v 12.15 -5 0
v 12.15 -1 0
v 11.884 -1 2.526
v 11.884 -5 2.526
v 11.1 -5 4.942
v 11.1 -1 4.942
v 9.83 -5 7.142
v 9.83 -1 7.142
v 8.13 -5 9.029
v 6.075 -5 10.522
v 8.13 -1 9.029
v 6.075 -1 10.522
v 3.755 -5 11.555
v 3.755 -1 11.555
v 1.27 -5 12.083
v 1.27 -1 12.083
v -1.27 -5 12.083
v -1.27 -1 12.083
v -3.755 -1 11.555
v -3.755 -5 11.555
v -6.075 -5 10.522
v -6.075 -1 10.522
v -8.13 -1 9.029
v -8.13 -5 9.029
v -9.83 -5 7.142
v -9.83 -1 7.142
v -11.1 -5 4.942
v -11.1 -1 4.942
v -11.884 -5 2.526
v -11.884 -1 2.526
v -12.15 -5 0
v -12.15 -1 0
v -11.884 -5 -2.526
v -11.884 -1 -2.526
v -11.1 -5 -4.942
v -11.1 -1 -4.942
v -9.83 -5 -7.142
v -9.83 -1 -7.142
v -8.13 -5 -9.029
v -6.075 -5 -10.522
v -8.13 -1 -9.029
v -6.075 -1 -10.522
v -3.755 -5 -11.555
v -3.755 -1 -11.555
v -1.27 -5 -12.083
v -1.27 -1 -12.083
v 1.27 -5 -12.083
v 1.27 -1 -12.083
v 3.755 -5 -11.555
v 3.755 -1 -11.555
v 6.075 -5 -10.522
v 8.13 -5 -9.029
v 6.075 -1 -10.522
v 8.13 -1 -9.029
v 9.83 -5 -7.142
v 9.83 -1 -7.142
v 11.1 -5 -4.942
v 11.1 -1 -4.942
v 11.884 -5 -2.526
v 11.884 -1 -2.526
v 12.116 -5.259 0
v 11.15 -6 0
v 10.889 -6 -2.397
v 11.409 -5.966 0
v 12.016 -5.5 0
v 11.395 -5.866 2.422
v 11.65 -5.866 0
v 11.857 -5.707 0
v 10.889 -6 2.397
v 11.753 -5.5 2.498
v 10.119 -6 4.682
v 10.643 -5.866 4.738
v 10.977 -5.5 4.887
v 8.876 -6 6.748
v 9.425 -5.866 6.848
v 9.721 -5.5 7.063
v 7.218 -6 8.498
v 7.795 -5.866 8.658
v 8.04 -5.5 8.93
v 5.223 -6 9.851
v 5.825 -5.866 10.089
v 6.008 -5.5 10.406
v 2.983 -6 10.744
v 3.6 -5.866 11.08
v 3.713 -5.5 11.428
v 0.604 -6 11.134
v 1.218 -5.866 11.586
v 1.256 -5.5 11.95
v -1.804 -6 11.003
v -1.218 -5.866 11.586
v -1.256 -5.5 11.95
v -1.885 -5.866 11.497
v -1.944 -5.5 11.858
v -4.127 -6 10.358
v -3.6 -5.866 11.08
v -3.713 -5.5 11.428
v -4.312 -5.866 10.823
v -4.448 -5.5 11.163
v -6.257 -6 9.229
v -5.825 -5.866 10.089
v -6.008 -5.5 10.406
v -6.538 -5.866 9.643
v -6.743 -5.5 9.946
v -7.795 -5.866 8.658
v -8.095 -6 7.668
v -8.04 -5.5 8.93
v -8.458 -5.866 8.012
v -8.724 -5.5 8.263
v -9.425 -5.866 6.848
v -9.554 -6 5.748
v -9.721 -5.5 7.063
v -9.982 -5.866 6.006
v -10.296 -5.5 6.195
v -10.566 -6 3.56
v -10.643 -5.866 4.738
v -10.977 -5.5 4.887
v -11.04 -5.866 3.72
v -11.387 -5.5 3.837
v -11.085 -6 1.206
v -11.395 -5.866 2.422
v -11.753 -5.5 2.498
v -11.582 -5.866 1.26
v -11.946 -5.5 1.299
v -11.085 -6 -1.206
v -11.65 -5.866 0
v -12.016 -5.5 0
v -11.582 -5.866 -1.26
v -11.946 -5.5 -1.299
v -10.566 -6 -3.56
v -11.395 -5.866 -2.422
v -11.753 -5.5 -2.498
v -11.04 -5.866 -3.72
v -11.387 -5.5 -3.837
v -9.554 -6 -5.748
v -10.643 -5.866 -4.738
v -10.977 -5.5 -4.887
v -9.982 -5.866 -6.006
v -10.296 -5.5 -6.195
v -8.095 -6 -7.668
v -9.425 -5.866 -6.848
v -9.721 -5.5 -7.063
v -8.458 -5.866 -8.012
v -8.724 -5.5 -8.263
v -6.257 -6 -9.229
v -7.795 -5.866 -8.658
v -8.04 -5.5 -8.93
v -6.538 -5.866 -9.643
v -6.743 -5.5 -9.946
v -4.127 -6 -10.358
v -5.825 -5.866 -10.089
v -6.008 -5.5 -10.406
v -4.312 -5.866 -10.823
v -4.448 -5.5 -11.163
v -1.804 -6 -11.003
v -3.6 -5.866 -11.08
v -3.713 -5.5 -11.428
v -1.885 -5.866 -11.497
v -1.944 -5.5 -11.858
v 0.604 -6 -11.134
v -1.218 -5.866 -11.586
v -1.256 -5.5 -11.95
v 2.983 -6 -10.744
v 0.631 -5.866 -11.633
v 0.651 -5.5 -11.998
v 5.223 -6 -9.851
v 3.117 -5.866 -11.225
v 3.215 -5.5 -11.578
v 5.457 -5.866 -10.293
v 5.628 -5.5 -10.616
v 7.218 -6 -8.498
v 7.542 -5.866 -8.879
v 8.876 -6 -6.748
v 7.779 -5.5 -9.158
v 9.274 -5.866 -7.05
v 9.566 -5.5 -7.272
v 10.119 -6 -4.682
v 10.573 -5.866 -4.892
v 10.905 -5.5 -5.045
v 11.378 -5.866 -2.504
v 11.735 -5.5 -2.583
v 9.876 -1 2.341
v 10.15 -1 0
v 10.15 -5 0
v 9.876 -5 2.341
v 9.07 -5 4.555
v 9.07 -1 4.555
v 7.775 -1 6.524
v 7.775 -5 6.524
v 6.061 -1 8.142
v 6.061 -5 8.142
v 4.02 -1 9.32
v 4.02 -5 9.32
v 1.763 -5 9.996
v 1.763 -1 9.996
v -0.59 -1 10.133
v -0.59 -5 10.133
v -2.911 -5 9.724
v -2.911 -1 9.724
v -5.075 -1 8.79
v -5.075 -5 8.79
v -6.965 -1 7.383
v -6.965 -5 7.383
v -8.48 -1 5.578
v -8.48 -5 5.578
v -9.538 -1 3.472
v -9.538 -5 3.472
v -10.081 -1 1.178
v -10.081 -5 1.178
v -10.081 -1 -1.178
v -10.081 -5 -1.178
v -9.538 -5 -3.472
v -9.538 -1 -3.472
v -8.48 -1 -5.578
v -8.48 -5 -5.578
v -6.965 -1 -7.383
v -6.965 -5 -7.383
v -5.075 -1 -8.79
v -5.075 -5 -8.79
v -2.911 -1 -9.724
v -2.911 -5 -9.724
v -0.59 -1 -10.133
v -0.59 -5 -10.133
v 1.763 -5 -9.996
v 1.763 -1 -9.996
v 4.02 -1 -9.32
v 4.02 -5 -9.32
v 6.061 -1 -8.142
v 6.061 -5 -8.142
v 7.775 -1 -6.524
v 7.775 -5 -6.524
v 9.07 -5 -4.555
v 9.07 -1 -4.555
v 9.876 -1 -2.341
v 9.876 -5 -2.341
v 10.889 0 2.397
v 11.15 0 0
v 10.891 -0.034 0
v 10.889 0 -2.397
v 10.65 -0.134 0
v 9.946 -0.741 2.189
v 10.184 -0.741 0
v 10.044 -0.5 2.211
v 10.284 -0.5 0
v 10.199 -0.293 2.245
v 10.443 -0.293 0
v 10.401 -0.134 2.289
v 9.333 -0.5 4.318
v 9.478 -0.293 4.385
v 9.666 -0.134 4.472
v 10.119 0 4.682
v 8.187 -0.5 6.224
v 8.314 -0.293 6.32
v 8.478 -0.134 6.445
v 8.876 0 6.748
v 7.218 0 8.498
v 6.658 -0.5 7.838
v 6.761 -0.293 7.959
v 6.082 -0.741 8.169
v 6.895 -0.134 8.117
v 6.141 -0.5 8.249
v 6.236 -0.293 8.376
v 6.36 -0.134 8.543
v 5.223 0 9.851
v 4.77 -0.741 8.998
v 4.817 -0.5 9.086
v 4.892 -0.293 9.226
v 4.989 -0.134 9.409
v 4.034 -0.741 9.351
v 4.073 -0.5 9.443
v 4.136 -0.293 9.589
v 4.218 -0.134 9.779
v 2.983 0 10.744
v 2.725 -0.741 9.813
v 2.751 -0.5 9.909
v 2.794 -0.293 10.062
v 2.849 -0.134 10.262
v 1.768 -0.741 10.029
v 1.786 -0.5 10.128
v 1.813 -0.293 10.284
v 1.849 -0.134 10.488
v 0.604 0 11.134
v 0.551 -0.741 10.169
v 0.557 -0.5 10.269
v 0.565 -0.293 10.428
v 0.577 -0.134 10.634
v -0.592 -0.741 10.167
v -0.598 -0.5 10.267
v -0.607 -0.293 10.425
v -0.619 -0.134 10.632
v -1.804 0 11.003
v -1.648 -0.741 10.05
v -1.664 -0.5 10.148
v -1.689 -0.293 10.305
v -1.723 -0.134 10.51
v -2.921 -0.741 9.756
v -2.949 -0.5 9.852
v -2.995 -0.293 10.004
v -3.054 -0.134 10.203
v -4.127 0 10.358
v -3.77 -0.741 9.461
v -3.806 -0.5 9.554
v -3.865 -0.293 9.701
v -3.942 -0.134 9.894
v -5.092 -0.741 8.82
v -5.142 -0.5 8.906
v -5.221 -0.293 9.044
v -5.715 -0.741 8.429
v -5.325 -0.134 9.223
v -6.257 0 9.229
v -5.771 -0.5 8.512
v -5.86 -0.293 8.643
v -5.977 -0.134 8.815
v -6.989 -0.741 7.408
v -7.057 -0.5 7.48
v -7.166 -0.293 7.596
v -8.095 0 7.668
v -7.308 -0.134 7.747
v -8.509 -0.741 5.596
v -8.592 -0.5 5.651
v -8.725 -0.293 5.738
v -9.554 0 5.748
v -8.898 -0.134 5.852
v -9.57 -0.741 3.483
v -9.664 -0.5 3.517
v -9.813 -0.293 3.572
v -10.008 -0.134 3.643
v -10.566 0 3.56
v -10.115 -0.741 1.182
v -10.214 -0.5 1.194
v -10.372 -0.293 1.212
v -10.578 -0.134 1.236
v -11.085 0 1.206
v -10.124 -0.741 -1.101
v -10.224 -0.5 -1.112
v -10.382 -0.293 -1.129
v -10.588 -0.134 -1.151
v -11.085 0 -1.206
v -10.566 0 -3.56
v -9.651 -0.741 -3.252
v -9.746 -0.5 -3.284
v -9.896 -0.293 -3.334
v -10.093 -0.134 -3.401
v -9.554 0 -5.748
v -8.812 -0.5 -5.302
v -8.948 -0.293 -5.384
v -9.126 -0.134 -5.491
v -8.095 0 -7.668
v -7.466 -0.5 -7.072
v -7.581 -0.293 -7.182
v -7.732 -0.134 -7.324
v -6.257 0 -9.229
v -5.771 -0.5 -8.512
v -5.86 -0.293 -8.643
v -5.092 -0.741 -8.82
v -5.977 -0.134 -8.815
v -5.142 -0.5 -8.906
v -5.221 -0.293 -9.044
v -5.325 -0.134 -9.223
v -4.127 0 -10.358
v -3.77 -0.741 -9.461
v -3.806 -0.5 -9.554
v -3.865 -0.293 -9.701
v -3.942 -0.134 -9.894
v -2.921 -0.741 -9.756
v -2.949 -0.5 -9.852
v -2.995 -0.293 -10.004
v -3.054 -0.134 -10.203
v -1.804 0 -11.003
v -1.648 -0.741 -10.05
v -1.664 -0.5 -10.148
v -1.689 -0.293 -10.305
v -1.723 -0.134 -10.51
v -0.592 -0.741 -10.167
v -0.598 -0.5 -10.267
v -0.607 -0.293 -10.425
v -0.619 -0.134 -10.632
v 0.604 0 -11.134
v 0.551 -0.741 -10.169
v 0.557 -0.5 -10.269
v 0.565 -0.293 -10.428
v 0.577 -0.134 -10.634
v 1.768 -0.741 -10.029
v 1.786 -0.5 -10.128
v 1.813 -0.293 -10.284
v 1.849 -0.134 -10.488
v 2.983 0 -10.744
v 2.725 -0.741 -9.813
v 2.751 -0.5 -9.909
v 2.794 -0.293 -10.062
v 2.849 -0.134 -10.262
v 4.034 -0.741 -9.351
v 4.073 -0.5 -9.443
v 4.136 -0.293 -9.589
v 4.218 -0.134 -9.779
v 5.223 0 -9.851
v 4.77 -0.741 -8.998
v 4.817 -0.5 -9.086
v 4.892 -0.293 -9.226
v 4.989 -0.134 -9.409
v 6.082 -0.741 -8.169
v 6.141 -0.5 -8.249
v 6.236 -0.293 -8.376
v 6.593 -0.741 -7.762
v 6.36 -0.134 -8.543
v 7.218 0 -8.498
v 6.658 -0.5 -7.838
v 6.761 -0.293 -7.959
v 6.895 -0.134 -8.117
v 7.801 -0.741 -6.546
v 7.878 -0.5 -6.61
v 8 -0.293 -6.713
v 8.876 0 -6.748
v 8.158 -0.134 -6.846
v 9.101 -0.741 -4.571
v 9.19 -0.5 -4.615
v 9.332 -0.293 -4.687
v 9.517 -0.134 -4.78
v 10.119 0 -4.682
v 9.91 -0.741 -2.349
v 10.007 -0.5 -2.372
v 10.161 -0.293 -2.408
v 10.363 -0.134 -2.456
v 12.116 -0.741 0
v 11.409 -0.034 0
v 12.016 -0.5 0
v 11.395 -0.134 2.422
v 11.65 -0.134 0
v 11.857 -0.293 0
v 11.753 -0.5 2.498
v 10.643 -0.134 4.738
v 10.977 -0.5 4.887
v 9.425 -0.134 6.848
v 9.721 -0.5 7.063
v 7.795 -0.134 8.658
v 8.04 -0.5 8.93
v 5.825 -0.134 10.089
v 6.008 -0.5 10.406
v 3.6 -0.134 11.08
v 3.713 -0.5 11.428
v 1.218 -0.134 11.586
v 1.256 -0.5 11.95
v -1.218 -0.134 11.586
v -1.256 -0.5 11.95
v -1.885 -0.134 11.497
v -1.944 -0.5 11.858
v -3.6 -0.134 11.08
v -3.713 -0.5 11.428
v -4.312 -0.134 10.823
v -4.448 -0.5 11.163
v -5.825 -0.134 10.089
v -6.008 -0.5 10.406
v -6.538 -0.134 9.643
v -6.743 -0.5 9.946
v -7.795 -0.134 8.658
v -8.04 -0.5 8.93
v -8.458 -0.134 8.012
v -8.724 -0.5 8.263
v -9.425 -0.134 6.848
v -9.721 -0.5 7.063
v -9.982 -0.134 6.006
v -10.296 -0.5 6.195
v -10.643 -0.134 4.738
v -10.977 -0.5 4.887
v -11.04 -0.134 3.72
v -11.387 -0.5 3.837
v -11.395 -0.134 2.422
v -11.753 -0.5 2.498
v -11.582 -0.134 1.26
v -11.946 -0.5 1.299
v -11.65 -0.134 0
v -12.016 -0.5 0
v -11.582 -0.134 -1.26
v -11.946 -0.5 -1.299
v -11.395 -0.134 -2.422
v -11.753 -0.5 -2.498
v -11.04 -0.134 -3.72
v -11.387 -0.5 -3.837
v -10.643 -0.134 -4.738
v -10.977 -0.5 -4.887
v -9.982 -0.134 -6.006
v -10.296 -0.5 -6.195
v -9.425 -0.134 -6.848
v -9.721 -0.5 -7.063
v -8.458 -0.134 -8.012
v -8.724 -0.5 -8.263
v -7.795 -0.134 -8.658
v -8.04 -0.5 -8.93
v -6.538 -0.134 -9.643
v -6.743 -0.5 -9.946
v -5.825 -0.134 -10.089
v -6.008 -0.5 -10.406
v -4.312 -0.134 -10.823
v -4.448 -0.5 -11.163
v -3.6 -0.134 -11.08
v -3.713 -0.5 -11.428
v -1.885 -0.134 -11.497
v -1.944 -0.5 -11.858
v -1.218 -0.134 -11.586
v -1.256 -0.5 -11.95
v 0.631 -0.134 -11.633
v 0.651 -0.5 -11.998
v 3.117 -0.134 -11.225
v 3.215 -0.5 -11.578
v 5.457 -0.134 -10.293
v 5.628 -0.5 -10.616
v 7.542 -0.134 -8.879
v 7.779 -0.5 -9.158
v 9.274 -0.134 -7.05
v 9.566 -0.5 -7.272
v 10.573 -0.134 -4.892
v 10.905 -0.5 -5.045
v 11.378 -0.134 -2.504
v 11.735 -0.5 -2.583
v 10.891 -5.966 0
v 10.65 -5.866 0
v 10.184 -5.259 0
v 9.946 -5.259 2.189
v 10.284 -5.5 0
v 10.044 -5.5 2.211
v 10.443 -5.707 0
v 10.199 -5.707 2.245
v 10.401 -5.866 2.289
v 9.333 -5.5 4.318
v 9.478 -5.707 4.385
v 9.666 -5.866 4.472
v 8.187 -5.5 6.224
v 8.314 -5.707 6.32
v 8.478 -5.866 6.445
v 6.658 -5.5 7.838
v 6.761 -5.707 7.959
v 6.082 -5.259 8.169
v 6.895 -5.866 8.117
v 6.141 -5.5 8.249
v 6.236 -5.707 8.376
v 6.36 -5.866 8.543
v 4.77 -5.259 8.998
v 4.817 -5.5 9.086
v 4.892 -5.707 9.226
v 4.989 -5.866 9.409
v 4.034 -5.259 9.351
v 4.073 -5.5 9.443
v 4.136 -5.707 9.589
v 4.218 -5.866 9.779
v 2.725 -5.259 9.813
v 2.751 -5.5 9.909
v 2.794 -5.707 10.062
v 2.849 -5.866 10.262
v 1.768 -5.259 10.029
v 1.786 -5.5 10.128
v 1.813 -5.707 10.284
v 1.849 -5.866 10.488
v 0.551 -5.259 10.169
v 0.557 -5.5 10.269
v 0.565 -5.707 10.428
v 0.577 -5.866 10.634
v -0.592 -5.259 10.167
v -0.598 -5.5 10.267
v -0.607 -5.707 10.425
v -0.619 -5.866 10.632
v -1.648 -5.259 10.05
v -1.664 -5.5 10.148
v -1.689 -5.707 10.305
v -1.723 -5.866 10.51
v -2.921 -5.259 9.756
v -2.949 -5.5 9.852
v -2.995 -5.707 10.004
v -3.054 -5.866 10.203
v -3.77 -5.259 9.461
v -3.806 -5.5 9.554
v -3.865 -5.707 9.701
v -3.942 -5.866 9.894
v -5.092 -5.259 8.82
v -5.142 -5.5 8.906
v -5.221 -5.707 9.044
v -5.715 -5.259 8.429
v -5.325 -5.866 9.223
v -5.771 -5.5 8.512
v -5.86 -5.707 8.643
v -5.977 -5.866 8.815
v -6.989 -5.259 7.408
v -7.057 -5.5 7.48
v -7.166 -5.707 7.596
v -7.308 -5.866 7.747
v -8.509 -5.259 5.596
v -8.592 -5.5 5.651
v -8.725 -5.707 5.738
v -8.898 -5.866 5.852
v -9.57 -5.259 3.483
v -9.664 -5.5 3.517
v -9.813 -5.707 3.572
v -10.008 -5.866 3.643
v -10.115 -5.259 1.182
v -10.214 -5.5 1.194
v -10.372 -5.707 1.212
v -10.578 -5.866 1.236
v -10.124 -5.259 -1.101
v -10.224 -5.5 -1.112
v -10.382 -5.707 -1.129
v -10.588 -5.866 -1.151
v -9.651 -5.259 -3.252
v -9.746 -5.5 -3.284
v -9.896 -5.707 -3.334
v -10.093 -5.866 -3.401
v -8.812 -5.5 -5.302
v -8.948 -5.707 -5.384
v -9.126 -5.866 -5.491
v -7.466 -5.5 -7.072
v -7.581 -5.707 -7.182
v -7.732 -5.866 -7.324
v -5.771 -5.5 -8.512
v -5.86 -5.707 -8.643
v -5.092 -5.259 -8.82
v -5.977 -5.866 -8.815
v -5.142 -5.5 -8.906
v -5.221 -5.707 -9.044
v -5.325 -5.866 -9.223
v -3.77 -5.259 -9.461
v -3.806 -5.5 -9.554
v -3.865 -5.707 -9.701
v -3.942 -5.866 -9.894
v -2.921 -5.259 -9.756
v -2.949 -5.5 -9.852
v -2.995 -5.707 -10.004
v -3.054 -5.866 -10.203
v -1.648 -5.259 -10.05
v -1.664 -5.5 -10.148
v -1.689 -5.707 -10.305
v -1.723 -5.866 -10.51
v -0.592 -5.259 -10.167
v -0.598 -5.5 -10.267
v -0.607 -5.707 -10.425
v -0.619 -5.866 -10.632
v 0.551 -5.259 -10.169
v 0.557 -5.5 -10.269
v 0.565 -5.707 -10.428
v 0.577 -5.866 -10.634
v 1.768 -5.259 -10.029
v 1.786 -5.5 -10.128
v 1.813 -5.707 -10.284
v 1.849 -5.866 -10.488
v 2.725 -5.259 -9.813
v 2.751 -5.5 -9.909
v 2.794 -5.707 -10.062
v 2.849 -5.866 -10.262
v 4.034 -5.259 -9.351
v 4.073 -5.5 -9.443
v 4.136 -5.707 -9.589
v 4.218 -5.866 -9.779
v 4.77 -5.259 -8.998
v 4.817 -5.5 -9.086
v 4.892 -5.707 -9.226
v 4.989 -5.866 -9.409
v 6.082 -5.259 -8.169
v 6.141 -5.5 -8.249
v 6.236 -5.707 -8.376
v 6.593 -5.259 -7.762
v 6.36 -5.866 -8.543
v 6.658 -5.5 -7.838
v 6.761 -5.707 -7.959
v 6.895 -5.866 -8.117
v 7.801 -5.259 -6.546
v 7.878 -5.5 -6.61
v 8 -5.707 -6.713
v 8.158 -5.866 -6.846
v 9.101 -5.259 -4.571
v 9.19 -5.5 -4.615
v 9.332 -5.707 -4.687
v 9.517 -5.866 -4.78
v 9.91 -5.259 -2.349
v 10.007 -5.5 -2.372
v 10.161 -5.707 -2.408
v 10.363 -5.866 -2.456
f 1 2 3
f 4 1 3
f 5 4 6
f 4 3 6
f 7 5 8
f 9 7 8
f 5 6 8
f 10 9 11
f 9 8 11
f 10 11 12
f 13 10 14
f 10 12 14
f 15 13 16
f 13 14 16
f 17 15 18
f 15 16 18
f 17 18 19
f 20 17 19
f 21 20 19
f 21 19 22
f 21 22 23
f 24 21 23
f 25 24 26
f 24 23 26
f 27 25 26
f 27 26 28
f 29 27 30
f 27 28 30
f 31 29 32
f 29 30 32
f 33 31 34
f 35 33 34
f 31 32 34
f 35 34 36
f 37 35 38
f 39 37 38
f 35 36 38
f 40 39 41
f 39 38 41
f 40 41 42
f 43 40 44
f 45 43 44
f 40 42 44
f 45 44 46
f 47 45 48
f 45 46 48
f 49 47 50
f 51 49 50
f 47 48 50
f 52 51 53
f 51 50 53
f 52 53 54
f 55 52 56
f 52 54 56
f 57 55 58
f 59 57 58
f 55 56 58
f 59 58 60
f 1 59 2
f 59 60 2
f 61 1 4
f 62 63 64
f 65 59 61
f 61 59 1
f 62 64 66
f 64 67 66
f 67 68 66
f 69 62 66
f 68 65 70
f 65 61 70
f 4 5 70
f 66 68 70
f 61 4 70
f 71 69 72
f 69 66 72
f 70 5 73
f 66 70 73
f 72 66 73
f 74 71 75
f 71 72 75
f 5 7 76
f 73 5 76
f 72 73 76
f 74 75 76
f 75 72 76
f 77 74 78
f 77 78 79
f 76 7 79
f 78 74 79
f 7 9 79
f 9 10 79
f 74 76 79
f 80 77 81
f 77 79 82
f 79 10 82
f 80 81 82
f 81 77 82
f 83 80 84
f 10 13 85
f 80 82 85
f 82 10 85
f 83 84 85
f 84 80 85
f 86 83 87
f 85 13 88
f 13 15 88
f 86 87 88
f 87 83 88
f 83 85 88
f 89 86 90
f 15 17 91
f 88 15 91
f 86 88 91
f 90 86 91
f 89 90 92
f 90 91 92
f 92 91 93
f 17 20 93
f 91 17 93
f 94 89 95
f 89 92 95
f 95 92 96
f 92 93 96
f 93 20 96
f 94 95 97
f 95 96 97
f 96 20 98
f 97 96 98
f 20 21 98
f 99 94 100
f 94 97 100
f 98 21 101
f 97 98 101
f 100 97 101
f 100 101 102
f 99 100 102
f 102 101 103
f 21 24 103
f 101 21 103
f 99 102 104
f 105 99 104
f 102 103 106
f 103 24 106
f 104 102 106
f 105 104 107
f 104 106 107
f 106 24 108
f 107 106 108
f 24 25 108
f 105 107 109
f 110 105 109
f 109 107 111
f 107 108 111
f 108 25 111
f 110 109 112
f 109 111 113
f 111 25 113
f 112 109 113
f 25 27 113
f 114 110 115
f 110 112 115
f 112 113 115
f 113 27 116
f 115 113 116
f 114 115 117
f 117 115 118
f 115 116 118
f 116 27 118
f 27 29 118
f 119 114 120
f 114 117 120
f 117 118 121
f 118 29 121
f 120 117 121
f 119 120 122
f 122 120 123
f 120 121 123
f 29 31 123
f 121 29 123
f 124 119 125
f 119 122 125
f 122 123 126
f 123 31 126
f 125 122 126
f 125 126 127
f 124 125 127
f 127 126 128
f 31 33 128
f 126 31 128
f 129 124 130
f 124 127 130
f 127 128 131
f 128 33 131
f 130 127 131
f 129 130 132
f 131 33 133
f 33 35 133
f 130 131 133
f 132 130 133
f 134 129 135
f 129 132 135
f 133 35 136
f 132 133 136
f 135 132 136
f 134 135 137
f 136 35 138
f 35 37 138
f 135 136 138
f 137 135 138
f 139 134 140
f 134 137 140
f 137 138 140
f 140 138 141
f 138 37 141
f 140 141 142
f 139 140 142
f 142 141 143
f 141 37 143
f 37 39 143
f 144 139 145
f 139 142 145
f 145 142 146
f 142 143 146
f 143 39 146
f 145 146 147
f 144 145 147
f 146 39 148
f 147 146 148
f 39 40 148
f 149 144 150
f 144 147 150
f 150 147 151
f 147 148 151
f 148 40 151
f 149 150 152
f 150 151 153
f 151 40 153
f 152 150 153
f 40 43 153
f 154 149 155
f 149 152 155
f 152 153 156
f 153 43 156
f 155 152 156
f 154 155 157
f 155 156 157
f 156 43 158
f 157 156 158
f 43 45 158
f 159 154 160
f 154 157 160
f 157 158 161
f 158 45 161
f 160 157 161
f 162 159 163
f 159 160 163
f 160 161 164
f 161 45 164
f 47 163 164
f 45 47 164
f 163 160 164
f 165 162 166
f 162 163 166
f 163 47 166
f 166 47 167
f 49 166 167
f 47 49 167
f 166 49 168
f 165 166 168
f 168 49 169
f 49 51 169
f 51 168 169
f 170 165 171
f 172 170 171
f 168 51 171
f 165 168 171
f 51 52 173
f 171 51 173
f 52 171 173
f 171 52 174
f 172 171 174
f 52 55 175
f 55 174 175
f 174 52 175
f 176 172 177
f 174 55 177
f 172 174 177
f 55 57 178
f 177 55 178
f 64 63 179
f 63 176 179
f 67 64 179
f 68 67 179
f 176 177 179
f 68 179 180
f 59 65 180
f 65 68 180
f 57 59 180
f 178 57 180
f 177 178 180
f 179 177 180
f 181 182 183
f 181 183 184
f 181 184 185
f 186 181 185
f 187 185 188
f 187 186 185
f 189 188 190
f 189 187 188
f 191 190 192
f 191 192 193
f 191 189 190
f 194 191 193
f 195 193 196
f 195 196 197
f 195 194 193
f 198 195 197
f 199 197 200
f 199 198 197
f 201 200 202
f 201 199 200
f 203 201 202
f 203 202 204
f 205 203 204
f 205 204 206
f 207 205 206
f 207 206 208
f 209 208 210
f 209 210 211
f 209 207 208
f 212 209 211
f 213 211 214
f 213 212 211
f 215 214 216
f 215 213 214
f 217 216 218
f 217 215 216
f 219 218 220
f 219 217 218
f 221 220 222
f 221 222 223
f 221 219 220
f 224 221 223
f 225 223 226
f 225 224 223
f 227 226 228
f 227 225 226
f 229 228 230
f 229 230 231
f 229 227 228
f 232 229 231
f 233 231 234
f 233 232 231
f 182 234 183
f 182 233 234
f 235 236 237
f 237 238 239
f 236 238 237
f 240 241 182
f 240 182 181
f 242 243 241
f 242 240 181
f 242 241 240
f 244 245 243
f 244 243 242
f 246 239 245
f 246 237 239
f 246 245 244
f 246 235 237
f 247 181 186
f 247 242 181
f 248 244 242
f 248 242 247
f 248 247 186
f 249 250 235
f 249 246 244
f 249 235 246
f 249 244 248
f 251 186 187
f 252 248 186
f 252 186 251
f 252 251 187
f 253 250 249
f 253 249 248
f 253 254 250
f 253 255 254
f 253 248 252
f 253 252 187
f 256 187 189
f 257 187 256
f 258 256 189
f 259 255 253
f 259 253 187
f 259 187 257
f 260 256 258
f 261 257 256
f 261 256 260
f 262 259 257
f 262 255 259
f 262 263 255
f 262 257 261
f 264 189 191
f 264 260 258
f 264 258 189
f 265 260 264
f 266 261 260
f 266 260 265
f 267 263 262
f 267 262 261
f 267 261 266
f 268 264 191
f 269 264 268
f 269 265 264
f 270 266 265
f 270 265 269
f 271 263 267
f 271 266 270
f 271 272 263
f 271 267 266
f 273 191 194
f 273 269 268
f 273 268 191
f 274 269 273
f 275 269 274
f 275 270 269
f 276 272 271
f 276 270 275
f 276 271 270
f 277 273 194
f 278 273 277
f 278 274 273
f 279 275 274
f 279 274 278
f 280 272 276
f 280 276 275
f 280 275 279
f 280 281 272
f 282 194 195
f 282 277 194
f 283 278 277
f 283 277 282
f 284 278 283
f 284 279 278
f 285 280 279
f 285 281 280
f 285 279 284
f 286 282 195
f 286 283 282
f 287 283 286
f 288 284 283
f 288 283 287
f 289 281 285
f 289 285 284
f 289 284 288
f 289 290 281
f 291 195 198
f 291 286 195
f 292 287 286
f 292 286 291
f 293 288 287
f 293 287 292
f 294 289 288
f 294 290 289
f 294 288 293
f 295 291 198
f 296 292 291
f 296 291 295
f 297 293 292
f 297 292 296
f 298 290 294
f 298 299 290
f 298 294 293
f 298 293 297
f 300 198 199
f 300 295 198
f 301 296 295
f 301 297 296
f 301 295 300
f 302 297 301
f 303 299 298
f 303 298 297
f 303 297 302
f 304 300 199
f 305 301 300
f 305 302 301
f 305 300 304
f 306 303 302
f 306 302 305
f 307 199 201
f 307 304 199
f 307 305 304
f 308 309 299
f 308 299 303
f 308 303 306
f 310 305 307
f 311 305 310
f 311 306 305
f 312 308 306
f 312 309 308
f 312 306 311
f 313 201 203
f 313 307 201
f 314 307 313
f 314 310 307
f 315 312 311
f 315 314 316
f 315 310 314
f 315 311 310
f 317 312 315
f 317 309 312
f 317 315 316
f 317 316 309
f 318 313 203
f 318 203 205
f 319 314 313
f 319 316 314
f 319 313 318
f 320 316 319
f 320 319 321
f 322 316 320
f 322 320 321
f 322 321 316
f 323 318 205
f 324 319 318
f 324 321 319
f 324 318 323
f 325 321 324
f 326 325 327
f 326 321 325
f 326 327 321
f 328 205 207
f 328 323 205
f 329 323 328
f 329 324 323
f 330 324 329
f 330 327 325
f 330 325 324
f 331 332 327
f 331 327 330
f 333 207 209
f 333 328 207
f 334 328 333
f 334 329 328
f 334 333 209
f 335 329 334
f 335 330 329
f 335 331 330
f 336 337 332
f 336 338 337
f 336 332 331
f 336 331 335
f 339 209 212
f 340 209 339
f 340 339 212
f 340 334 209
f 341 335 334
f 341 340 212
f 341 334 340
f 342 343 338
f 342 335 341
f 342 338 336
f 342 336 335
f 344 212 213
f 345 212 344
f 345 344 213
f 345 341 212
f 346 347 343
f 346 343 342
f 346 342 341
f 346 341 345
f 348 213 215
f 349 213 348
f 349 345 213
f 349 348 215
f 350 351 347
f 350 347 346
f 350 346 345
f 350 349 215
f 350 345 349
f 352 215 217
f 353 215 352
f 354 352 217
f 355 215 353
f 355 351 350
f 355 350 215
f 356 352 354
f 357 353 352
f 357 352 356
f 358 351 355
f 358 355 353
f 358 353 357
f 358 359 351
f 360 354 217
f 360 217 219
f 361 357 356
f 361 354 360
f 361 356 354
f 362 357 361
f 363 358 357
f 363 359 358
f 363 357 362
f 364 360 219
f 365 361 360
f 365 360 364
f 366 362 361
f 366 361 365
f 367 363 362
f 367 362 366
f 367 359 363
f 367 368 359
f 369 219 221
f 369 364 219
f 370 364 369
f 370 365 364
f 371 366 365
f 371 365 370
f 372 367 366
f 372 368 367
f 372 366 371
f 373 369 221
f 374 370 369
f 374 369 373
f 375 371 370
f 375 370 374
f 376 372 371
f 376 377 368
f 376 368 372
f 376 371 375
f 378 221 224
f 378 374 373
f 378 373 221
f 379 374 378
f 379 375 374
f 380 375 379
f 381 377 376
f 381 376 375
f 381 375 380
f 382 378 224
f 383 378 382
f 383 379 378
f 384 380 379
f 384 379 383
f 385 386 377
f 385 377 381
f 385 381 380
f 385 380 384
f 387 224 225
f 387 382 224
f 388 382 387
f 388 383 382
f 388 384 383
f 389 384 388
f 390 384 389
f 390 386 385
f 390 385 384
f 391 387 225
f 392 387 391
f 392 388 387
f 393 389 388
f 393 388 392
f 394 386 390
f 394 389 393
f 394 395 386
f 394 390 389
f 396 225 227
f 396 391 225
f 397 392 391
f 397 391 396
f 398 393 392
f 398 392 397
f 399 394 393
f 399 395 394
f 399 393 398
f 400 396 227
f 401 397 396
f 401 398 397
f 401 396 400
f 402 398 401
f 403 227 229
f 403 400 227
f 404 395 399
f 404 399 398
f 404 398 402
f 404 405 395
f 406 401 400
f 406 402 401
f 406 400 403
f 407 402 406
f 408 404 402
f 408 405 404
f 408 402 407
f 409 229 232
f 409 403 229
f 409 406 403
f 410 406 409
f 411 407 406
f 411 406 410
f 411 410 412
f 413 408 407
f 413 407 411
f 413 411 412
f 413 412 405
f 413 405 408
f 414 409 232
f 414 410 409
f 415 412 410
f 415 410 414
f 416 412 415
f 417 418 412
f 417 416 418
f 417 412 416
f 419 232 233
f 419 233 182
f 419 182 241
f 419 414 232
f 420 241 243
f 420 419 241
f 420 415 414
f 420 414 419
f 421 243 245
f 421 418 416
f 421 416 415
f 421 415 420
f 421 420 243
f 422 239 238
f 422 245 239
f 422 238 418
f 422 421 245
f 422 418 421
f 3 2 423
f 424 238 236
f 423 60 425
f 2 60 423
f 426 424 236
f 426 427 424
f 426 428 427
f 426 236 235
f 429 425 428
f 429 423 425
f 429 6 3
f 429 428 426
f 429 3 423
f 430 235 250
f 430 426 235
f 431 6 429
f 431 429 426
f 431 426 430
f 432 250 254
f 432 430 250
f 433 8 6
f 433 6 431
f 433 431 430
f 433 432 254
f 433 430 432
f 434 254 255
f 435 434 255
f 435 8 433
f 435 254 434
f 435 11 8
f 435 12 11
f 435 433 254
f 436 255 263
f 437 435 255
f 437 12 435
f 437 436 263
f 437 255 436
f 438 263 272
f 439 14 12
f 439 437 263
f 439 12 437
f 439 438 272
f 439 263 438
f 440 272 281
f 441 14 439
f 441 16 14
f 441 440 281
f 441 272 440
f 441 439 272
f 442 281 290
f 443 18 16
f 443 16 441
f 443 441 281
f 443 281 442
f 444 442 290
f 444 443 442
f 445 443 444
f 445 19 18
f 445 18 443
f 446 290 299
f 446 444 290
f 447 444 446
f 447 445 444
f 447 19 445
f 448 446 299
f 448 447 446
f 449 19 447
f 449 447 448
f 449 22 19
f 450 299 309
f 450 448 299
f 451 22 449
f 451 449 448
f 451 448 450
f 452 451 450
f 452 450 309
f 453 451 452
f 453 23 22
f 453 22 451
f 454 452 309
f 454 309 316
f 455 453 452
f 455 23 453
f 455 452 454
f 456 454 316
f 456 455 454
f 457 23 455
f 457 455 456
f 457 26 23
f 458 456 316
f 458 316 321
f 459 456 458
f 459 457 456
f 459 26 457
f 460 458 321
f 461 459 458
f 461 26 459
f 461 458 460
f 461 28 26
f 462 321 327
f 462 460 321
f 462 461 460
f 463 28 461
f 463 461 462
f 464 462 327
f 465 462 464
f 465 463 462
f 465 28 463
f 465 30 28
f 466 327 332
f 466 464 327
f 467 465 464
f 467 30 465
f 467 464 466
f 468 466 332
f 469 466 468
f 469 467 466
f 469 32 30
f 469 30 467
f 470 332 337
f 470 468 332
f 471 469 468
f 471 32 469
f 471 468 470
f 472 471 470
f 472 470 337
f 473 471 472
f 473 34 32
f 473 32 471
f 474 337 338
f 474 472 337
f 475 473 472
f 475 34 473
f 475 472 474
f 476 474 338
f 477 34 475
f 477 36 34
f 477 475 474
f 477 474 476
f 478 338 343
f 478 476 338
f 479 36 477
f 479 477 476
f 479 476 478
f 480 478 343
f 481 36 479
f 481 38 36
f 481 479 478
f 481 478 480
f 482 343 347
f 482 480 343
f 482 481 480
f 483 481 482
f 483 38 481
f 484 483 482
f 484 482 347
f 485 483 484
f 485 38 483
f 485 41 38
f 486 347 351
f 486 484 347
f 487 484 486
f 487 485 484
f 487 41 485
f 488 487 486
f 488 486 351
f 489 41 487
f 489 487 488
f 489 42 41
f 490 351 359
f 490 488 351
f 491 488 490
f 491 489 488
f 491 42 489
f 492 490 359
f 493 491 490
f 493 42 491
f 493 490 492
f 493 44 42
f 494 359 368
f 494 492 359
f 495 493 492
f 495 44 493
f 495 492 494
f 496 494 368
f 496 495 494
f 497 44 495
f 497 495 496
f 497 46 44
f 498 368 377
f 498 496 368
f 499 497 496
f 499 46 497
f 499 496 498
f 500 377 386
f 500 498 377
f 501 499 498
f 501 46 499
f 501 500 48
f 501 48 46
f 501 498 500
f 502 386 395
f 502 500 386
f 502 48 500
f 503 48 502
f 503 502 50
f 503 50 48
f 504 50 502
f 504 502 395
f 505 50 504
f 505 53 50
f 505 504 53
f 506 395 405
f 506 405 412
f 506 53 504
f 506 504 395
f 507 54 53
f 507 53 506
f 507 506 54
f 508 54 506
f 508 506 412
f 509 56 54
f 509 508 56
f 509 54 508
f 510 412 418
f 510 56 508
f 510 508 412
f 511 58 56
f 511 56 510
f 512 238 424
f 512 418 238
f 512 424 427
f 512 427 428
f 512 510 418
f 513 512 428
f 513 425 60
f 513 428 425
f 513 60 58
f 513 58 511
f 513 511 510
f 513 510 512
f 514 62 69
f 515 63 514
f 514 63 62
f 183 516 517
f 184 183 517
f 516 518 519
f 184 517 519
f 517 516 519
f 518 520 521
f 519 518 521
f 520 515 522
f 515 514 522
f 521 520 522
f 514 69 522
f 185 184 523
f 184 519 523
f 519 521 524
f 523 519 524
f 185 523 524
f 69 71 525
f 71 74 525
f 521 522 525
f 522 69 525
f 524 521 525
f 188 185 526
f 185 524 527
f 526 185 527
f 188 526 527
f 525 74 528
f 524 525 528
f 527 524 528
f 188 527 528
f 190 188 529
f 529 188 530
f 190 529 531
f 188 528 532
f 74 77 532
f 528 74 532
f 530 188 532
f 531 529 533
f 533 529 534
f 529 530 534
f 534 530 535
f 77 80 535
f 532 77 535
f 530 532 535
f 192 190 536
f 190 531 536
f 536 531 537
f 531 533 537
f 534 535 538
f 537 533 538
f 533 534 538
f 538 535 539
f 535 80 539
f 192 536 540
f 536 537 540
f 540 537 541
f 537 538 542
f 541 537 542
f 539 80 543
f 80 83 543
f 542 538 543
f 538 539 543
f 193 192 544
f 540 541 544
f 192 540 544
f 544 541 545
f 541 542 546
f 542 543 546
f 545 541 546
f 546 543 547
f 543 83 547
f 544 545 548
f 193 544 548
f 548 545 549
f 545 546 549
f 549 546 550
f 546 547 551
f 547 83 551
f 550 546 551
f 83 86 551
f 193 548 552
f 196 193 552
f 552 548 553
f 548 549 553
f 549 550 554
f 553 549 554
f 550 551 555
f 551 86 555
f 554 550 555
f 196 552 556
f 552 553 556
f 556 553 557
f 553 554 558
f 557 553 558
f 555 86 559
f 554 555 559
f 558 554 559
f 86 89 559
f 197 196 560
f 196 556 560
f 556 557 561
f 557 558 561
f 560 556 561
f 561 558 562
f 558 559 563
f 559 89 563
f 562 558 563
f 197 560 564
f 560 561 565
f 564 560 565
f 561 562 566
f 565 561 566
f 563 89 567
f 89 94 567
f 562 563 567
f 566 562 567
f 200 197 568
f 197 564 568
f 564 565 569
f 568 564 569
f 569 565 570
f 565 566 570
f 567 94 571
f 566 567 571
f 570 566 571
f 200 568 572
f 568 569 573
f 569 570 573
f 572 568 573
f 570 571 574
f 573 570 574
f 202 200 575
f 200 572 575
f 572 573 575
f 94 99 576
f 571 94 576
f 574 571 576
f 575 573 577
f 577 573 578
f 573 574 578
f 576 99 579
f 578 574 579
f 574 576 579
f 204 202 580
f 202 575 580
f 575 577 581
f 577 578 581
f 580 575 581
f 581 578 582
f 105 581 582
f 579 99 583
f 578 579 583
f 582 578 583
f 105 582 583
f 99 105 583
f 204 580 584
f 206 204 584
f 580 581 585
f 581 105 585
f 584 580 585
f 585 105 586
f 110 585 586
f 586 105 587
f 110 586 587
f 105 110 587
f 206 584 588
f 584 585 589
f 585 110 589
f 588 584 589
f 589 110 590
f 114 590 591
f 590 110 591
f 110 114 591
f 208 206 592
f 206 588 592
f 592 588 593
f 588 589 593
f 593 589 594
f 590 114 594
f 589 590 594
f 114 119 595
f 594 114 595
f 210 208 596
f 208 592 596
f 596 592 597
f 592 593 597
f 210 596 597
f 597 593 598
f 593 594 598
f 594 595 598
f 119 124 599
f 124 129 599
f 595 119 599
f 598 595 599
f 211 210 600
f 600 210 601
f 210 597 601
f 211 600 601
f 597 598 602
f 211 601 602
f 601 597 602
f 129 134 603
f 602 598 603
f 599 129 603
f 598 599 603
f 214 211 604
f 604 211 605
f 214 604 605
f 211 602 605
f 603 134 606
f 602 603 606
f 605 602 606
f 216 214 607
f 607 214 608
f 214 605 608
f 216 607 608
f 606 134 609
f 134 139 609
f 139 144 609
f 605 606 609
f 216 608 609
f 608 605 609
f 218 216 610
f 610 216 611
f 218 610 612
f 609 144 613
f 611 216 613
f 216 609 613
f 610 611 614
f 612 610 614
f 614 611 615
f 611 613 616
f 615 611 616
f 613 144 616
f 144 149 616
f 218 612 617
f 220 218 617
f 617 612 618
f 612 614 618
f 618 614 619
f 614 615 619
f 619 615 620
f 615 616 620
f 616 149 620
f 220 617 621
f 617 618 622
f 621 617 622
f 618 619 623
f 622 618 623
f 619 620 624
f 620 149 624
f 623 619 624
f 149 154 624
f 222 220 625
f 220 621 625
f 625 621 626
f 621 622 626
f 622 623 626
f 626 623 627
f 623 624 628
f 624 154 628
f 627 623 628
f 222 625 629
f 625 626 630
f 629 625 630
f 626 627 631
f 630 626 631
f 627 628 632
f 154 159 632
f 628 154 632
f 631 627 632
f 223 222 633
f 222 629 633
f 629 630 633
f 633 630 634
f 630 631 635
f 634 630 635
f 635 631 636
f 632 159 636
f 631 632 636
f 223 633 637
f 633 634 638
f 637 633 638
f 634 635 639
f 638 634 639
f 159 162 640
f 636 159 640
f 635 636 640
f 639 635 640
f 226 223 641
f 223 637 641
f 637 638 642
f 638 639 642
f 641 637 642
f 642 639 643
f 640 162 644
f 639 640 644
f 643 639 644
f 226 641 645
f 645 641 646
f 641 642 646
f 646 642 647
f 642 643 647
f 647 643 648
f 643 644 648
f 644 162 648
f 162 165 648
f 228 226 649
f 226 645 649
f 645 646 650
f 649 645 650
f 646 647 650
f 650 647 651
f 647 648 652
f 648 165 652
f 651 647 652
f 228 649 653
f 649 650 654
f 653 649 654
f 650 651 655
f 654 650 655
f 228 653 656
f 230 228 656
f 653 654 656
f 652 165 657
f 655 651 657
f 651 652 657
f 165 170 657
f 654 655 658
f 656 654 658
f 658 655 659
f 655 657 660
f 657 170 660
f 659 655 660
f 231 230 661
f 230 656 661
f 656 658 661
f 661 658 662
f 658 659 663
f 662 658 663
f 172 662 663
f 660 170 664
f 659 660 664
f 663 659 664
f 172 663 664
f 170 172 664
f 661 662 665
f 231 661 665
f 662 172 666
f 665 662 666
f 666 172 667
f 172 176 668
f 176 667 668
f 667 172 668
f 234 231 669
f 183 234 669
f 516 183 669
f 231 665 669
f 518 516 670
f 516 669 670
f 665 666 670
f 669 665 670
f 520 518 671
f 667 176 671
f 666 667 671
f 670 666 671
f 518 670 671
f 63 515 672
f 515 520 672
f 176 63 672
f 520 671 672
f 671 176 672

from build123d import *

# Parameters (mm, degrees)
F0_R     = 12.15
F0_R_2   = 10.15
F1_DEPTH = 6
F2_R     = 1
F3_R     = 0.99999


# Not quite as in the source:
# - a fillet or chamfer is up to 0.001 mm smaller than in the source, because OpenCascade refuses the exact size


with BuildPart() as f1:
    # F0 (on Front) → F1 (new body)
    with BuildSketch(Plane.XZ):
        Circle(F0_R)
        Circle(F0_R_2, mode=Mode.SUBTRACT)
    extrude(amount=F1_DEPTH)

    # F2
    f2_edges = [f1.edges().sort_by_distance(p)[0] for p in [
        (-10.15, -6, 0),
        (-10.15, 0, 0),
    ]]
    fillet(f2_edges, radius=F2_R)

    # F3 (radius 1 in the source; OpenCascade refuses exactly that, so slightly less here)
    f3_edges = [f1.edges().sort_by_distance(p)[0] for p in [
        (-12.15, 0, 0),
        (-12.15, -6, 0),
    ]]
    fillet(f3_edges, radius=F3_R)


solid = f1.part
